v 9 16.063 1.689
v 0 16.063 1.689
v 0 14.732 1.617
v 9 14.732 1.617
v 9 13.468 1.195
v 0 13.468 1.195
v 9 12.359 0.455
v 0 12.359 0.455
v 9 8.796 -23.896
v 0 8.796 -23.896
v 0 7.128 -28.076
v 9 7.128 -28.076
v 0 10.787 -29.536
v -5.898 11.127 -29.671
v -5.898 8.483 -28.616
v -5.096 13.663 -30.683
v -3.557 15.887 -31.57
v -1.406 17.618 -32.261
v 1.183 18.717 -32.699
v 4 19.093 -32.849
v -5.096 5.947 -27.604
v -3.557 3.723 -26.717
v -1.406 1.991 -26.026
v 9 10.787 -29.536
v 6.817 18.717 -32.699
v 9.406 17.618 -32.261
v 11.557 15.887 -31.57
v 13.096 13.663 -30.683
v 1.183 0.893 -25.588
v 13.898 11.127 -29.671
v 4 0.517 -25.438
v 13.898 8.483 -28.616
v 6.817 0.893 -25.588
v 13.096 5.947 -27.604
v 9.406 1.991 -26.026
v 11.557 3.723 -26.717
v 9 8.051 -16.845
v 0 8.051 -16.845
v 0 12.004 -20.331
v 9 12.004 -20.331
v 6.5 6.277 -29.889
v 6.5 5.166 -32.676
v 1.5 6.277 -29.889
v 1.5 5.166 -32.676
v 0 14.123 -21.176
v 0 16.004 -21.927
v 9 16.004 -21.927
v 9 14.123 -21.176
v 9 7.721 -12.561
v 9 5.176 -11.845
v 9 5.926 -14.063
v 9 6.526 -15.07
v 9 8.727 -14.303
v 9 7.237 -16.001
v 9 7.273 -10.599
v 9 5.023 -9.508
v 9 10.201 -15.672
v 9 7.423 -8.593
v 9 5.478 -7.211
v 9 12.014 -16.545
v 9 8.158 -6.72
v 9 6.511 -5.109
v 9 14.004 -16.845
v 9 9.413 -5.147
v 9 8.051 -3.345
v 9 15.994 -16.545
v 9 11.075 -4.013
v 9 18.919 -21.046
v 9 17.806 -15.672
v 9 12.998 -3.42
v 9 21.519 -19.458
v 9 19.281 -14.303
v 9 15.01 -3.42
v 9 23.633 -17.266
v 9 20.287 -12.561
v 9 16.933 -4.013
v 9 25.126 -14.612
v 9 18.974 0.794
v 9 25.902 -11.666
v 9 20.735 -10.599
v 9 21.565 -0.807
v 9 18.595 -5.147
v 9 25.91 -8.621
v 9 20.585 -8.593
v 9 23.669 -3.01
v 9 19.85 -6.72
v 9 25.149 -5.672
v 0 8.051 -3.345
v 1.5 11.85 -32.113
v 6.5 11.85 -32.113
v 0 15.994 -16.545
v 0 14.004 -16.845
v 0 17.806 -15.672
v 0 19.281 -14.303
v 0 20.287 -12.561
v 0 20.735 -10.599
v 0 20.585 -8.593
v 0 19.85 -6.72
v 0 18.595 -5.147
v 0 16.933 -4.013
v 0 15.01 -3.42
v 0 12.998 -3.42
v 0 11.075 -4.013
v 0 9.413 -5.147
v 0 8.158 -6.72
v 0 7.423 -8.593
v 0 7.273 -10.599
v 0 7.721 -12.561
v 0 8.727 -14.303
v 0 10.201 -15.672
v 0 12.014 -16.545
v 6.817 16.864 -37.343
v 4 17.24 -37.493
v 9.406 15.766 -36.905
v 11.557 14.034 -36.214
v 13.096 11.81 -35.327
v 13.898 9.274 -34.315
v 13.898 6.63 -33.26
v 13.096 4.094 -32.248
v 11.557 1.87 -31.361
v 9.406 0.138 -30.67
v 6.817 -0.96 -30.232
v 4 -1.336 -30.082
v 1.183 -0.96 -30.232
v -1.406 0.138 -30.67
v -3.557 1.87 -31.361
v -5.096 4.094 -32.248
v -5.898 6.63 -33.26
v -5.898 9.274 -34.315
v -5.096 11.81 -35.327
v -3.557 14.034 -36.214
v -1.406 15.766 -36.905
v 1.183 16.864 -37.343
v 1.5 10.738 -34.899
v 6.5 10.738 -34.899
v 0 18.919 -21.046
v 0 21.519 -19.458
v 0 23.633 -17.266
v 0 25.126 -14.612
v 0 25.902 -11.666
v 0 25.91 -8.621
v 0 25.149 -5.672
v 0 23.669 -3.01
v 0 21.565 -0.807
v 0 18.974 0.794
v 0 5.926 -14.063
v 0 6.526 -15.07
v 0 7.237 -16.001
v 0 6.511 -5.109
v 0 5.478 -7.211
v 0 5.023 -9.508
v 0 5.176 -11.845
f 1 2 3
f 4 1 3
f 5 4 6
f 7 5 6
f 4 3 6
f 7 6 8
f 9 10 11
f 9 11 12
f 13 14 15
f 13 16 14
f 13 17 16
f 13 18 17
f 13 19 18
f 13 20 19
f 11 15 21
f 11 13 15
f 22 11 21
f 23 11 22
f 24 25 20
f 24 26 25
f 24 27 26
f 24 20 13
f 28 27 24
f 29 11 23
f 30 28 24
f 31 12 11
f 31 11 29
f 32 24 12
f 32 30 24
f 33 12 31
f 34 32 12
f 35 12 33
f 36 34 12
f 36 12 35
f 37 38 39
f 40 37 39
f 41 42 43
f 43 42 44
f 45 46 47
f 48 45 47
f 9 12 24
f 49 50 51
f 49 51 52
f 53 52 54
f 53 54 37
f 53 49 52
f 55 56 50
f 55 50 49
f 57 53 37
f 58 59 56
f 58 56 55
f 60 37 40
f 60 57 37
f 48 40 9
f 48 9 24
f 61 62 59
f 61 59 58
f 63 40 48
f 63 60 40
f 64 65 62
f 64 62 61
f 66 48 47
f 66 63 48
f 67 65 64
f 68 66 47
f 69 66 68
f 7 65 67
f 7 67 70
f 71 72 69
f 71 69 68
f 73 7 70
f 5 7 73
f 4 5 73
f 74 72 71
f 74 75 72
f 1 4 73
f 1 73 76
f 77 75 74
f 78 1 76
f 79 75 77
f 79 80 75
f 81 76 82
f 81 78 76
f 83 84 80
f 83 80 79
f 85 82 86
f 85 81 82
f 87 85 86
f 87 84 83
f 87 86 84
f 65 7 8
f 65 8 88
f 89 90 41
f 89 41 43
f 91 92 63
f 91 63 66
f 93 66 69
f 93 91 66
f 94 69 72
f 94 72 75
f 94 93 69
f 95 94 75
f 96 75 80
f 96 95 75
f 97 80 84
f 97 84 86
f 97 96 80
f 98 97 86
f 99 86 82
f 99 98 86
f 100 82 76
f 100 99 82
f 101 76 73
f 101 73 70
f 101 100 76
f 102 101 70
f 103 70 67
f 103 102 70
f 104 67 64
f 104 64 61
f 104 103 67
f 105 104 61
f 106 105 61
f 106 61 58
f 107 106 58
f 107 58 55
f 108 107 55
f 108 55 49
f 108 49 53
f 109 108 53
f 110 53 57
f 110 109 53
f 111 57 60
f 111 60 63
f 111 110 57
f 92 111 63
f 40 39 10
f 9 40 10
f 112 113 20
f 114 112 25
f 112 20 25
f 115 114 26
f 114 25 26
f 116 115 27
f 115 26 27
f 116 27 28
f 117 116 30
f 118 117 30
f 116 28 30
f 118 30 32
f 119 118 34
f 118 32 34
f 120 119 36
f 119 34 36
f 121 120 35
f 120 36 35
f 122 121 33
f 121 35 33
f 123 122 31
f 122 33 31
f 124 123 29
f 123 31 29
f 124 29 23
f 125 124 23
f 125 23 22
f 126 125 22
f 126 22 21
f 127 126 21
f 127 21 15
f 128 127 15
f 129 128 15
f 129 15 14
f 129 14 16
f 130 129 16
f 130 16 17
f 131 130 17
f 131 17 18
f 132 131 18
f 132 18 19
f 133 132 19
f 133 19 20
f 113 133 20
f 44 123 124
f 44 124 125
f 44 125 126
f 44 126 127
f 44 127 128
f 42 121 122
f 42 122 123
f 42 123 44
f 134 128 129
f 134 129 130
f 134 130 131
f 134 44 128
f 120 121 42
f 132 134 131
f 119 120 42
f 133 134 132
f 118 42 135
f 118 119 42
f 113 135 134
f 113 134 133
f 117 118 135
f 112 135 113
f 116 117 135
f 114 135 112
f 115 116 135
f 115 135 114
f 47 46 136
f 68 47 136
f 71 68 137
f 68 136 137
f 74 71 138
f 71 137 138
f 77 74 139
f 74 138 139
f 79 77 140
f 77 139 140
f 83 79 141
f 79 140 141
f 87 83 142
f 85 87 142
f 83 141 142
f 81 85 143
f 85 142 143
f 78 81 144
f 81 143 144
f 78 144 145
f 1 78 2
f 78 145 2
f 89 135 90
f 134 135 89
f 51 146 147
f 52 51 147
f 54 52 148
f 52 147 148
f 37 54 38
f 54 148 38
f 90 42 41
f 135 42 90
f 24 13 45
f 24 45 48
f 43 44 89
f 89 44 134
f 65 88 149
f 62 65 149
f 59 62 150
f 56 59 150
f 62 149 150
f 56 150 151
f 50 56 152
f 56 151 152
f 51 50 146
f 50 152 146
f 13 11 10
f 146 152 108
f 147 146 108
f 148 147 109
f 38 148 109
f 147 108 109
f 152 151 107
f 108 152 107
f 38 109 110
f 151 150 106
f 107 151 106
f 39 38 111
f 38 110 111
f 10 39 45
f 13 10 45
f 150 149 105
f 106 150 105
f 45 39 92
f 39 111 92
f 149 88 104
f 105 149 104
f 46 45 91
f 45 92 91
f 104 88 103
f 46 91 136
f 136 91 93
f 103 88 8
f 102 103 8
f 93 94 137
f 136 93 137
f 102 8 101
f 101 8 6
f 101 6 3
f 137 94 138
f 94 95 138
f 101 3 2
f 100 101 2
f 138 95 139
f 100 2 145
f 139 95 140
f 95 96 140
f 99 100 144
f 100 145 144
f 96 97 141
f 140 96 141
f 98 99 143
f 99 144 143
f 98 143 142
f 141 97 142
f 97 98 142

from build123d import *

# Parameters (mm, degrees)
SKETCH1_R           = 6.750001985
BOSS_EXTRUDE1_DEPTH = 9
SKETCH3_R           = 10.000000826
BOSS_EXTRUDE2_DEPTH = 14
SKETCH4_R           = 10.000000826
SKETCH4_W           = 9
SKETCH4_H           = 8.939675258
CUT_EXTRUDE1_DEPTH  = 9
SKETCH5_W           = 9
SKETCH5_H           = 9
CUT_EXTRUDE2_DEPTH  = 3
SKETCH6_W           = 9
SKETCH6_H           = 9
CUT_EXTRUDE4_DEPTH  = 2
CUT_EXTRUDE5_DEPTH  = 10
SKETCH8_W           = 5
SKETCH8_H           = 6
CUT_EXTRUDE6_DEPTH  = 3


with BuildPart() as part:
    # Sketch1 → Boss-Extrude1 (new body)
    with BuildSketch(Plane(origin=(0, 0, 0), x_dir=(0, 0, -1), z_dir=(1, 0, 0))):
        with BuildLine():
            Line((-0.454941956, 12.359391949), (3.344728948, 8.050966095))
            ThreePointArc((3.344728948, 8.050966095), (8.344592491, 5.175709333), (14.063217322, 5.92608719))
            ThreePointArc((14.063217322, 5.92608719), (15.54600466, 6.868056536), (16.844733397, 8.050963212))
            Line((16.844733397, 8.050963212), (20.330899398, 12.003905107))
            Line((20.330899398, 12.003905107), (21.92689244, 16.003905107))
            ThreePointArc((21.92689244, 16.003905107), (10.143848092, 26.003055139), (-1.689188798, 16.063116838))
            ThreePointArc((-1.689188798, 16.063116838), (-1.448481266, 14.085815778), (-0.454941956, 12.359391949))
        make_face()
        with Locations((10.094731316, 14.003903077)):
            Circle(SKETCH1_R, mode=Mode.SUBTRACT)
    extrude(amount=BOSS_EXTRUDE1_DEPTH)

    # Sketch3 → Boss-Extrude2 (add)
    with BuildSketch(Plane(origin=(0, -5.349360366, -13.40697666), x_dir=(-1, 0, 0), z_dir=(0, -0.3705884577579875, -0.9287971764473427))):
        with Locations(Location((-4, 19.907031212, 0), (0, 0, 90))):
            Circle(SKETCH3_R)
    extrude(amount=BOSS_EXTRUDE2_DEPTH)

    # Sketch4 → Cut-Extrude1 (cut)
    with BuildSketch(Plane(origin=(0, -5.349360366, -13.40697666), x_dir=(1, 0, 0), z_dir=(0, 0.3705884577579875, 0.9287971764473427))):
        with Locations(Location((4, 19.907031212, 0), (0, 0, 270))):
            Circle(SKETCH4_R)
        with Locations((4.5, 19.495062719)):
            Rectangle(SKETCH4_W, SKETCH4_H, mode=Mode.SUBTRACT)
    extrude(amount=-CUT_EXTRUDE1_DEPTH, mode=Mode.SUBTRACT)

    # Sketch5 → Cut-Extrude2 (cut)
    with BuildSketch(Plane(origin=(0, 22.258531777, -8.88111546), x_dir=(1, 0, 0), z_dir=(0, 0.9287971764473427, -0.3705884577579875))):
        with Locations((4.5, 18.934773275)):
            Rectangle(SKETCH5_W, SKETCH5_H)
    extrude(amount=-CUT_EXTRUDE2_DEPTH, mode=Mode.SUBTRACT)

    # Sketch6 → Cut-Extrude4 (cut)
    with BuildSketch(Plane(origin=(0, 13.955386639, -5.568174994), x_dir=(1, 0, 0), z_dir=(0, -0.9287971764473427, 0.3705884577579875))):
        with Locations((4.5, -18.934773275)):
            Rectangle(SKETCH6_W, SKETCH6_H)
    extrude(amount=-CUT_EXTRUDE4_DEPTH, mode=Mode.SUBTRACT)

    # Sketch7 → Cut-Extrude5 (cut)
    with BuildSketch(Plane.ZY):
        Polygon((-20.330899398, 12.003905107), (-23.895915863, 8.795972566), (-19.716328569, 10.463620626), align=None)
    extrude(amount=-CUT_EXTRUDE5_DEPTH, mode=Mode.SUBTRACT)

    # Sketch8 → Cut-Extrude6 (cut)
    with BuildSketch(Plane(origin=(0, -10.537598775, -26.41013713), x_dir=(-1, 0, 0), z_dir=(0, -0.3705884577579875, -0.9287971764473427))):
        with Locations((-4, 19.907031212)):
            Rectangle(SKETCH8_W, SKETCH8_H)
    extrude(amount=-CUT_EXTRUDE6_DEPTH, mode=Mode.SUBTRACT)


solid = part.part
